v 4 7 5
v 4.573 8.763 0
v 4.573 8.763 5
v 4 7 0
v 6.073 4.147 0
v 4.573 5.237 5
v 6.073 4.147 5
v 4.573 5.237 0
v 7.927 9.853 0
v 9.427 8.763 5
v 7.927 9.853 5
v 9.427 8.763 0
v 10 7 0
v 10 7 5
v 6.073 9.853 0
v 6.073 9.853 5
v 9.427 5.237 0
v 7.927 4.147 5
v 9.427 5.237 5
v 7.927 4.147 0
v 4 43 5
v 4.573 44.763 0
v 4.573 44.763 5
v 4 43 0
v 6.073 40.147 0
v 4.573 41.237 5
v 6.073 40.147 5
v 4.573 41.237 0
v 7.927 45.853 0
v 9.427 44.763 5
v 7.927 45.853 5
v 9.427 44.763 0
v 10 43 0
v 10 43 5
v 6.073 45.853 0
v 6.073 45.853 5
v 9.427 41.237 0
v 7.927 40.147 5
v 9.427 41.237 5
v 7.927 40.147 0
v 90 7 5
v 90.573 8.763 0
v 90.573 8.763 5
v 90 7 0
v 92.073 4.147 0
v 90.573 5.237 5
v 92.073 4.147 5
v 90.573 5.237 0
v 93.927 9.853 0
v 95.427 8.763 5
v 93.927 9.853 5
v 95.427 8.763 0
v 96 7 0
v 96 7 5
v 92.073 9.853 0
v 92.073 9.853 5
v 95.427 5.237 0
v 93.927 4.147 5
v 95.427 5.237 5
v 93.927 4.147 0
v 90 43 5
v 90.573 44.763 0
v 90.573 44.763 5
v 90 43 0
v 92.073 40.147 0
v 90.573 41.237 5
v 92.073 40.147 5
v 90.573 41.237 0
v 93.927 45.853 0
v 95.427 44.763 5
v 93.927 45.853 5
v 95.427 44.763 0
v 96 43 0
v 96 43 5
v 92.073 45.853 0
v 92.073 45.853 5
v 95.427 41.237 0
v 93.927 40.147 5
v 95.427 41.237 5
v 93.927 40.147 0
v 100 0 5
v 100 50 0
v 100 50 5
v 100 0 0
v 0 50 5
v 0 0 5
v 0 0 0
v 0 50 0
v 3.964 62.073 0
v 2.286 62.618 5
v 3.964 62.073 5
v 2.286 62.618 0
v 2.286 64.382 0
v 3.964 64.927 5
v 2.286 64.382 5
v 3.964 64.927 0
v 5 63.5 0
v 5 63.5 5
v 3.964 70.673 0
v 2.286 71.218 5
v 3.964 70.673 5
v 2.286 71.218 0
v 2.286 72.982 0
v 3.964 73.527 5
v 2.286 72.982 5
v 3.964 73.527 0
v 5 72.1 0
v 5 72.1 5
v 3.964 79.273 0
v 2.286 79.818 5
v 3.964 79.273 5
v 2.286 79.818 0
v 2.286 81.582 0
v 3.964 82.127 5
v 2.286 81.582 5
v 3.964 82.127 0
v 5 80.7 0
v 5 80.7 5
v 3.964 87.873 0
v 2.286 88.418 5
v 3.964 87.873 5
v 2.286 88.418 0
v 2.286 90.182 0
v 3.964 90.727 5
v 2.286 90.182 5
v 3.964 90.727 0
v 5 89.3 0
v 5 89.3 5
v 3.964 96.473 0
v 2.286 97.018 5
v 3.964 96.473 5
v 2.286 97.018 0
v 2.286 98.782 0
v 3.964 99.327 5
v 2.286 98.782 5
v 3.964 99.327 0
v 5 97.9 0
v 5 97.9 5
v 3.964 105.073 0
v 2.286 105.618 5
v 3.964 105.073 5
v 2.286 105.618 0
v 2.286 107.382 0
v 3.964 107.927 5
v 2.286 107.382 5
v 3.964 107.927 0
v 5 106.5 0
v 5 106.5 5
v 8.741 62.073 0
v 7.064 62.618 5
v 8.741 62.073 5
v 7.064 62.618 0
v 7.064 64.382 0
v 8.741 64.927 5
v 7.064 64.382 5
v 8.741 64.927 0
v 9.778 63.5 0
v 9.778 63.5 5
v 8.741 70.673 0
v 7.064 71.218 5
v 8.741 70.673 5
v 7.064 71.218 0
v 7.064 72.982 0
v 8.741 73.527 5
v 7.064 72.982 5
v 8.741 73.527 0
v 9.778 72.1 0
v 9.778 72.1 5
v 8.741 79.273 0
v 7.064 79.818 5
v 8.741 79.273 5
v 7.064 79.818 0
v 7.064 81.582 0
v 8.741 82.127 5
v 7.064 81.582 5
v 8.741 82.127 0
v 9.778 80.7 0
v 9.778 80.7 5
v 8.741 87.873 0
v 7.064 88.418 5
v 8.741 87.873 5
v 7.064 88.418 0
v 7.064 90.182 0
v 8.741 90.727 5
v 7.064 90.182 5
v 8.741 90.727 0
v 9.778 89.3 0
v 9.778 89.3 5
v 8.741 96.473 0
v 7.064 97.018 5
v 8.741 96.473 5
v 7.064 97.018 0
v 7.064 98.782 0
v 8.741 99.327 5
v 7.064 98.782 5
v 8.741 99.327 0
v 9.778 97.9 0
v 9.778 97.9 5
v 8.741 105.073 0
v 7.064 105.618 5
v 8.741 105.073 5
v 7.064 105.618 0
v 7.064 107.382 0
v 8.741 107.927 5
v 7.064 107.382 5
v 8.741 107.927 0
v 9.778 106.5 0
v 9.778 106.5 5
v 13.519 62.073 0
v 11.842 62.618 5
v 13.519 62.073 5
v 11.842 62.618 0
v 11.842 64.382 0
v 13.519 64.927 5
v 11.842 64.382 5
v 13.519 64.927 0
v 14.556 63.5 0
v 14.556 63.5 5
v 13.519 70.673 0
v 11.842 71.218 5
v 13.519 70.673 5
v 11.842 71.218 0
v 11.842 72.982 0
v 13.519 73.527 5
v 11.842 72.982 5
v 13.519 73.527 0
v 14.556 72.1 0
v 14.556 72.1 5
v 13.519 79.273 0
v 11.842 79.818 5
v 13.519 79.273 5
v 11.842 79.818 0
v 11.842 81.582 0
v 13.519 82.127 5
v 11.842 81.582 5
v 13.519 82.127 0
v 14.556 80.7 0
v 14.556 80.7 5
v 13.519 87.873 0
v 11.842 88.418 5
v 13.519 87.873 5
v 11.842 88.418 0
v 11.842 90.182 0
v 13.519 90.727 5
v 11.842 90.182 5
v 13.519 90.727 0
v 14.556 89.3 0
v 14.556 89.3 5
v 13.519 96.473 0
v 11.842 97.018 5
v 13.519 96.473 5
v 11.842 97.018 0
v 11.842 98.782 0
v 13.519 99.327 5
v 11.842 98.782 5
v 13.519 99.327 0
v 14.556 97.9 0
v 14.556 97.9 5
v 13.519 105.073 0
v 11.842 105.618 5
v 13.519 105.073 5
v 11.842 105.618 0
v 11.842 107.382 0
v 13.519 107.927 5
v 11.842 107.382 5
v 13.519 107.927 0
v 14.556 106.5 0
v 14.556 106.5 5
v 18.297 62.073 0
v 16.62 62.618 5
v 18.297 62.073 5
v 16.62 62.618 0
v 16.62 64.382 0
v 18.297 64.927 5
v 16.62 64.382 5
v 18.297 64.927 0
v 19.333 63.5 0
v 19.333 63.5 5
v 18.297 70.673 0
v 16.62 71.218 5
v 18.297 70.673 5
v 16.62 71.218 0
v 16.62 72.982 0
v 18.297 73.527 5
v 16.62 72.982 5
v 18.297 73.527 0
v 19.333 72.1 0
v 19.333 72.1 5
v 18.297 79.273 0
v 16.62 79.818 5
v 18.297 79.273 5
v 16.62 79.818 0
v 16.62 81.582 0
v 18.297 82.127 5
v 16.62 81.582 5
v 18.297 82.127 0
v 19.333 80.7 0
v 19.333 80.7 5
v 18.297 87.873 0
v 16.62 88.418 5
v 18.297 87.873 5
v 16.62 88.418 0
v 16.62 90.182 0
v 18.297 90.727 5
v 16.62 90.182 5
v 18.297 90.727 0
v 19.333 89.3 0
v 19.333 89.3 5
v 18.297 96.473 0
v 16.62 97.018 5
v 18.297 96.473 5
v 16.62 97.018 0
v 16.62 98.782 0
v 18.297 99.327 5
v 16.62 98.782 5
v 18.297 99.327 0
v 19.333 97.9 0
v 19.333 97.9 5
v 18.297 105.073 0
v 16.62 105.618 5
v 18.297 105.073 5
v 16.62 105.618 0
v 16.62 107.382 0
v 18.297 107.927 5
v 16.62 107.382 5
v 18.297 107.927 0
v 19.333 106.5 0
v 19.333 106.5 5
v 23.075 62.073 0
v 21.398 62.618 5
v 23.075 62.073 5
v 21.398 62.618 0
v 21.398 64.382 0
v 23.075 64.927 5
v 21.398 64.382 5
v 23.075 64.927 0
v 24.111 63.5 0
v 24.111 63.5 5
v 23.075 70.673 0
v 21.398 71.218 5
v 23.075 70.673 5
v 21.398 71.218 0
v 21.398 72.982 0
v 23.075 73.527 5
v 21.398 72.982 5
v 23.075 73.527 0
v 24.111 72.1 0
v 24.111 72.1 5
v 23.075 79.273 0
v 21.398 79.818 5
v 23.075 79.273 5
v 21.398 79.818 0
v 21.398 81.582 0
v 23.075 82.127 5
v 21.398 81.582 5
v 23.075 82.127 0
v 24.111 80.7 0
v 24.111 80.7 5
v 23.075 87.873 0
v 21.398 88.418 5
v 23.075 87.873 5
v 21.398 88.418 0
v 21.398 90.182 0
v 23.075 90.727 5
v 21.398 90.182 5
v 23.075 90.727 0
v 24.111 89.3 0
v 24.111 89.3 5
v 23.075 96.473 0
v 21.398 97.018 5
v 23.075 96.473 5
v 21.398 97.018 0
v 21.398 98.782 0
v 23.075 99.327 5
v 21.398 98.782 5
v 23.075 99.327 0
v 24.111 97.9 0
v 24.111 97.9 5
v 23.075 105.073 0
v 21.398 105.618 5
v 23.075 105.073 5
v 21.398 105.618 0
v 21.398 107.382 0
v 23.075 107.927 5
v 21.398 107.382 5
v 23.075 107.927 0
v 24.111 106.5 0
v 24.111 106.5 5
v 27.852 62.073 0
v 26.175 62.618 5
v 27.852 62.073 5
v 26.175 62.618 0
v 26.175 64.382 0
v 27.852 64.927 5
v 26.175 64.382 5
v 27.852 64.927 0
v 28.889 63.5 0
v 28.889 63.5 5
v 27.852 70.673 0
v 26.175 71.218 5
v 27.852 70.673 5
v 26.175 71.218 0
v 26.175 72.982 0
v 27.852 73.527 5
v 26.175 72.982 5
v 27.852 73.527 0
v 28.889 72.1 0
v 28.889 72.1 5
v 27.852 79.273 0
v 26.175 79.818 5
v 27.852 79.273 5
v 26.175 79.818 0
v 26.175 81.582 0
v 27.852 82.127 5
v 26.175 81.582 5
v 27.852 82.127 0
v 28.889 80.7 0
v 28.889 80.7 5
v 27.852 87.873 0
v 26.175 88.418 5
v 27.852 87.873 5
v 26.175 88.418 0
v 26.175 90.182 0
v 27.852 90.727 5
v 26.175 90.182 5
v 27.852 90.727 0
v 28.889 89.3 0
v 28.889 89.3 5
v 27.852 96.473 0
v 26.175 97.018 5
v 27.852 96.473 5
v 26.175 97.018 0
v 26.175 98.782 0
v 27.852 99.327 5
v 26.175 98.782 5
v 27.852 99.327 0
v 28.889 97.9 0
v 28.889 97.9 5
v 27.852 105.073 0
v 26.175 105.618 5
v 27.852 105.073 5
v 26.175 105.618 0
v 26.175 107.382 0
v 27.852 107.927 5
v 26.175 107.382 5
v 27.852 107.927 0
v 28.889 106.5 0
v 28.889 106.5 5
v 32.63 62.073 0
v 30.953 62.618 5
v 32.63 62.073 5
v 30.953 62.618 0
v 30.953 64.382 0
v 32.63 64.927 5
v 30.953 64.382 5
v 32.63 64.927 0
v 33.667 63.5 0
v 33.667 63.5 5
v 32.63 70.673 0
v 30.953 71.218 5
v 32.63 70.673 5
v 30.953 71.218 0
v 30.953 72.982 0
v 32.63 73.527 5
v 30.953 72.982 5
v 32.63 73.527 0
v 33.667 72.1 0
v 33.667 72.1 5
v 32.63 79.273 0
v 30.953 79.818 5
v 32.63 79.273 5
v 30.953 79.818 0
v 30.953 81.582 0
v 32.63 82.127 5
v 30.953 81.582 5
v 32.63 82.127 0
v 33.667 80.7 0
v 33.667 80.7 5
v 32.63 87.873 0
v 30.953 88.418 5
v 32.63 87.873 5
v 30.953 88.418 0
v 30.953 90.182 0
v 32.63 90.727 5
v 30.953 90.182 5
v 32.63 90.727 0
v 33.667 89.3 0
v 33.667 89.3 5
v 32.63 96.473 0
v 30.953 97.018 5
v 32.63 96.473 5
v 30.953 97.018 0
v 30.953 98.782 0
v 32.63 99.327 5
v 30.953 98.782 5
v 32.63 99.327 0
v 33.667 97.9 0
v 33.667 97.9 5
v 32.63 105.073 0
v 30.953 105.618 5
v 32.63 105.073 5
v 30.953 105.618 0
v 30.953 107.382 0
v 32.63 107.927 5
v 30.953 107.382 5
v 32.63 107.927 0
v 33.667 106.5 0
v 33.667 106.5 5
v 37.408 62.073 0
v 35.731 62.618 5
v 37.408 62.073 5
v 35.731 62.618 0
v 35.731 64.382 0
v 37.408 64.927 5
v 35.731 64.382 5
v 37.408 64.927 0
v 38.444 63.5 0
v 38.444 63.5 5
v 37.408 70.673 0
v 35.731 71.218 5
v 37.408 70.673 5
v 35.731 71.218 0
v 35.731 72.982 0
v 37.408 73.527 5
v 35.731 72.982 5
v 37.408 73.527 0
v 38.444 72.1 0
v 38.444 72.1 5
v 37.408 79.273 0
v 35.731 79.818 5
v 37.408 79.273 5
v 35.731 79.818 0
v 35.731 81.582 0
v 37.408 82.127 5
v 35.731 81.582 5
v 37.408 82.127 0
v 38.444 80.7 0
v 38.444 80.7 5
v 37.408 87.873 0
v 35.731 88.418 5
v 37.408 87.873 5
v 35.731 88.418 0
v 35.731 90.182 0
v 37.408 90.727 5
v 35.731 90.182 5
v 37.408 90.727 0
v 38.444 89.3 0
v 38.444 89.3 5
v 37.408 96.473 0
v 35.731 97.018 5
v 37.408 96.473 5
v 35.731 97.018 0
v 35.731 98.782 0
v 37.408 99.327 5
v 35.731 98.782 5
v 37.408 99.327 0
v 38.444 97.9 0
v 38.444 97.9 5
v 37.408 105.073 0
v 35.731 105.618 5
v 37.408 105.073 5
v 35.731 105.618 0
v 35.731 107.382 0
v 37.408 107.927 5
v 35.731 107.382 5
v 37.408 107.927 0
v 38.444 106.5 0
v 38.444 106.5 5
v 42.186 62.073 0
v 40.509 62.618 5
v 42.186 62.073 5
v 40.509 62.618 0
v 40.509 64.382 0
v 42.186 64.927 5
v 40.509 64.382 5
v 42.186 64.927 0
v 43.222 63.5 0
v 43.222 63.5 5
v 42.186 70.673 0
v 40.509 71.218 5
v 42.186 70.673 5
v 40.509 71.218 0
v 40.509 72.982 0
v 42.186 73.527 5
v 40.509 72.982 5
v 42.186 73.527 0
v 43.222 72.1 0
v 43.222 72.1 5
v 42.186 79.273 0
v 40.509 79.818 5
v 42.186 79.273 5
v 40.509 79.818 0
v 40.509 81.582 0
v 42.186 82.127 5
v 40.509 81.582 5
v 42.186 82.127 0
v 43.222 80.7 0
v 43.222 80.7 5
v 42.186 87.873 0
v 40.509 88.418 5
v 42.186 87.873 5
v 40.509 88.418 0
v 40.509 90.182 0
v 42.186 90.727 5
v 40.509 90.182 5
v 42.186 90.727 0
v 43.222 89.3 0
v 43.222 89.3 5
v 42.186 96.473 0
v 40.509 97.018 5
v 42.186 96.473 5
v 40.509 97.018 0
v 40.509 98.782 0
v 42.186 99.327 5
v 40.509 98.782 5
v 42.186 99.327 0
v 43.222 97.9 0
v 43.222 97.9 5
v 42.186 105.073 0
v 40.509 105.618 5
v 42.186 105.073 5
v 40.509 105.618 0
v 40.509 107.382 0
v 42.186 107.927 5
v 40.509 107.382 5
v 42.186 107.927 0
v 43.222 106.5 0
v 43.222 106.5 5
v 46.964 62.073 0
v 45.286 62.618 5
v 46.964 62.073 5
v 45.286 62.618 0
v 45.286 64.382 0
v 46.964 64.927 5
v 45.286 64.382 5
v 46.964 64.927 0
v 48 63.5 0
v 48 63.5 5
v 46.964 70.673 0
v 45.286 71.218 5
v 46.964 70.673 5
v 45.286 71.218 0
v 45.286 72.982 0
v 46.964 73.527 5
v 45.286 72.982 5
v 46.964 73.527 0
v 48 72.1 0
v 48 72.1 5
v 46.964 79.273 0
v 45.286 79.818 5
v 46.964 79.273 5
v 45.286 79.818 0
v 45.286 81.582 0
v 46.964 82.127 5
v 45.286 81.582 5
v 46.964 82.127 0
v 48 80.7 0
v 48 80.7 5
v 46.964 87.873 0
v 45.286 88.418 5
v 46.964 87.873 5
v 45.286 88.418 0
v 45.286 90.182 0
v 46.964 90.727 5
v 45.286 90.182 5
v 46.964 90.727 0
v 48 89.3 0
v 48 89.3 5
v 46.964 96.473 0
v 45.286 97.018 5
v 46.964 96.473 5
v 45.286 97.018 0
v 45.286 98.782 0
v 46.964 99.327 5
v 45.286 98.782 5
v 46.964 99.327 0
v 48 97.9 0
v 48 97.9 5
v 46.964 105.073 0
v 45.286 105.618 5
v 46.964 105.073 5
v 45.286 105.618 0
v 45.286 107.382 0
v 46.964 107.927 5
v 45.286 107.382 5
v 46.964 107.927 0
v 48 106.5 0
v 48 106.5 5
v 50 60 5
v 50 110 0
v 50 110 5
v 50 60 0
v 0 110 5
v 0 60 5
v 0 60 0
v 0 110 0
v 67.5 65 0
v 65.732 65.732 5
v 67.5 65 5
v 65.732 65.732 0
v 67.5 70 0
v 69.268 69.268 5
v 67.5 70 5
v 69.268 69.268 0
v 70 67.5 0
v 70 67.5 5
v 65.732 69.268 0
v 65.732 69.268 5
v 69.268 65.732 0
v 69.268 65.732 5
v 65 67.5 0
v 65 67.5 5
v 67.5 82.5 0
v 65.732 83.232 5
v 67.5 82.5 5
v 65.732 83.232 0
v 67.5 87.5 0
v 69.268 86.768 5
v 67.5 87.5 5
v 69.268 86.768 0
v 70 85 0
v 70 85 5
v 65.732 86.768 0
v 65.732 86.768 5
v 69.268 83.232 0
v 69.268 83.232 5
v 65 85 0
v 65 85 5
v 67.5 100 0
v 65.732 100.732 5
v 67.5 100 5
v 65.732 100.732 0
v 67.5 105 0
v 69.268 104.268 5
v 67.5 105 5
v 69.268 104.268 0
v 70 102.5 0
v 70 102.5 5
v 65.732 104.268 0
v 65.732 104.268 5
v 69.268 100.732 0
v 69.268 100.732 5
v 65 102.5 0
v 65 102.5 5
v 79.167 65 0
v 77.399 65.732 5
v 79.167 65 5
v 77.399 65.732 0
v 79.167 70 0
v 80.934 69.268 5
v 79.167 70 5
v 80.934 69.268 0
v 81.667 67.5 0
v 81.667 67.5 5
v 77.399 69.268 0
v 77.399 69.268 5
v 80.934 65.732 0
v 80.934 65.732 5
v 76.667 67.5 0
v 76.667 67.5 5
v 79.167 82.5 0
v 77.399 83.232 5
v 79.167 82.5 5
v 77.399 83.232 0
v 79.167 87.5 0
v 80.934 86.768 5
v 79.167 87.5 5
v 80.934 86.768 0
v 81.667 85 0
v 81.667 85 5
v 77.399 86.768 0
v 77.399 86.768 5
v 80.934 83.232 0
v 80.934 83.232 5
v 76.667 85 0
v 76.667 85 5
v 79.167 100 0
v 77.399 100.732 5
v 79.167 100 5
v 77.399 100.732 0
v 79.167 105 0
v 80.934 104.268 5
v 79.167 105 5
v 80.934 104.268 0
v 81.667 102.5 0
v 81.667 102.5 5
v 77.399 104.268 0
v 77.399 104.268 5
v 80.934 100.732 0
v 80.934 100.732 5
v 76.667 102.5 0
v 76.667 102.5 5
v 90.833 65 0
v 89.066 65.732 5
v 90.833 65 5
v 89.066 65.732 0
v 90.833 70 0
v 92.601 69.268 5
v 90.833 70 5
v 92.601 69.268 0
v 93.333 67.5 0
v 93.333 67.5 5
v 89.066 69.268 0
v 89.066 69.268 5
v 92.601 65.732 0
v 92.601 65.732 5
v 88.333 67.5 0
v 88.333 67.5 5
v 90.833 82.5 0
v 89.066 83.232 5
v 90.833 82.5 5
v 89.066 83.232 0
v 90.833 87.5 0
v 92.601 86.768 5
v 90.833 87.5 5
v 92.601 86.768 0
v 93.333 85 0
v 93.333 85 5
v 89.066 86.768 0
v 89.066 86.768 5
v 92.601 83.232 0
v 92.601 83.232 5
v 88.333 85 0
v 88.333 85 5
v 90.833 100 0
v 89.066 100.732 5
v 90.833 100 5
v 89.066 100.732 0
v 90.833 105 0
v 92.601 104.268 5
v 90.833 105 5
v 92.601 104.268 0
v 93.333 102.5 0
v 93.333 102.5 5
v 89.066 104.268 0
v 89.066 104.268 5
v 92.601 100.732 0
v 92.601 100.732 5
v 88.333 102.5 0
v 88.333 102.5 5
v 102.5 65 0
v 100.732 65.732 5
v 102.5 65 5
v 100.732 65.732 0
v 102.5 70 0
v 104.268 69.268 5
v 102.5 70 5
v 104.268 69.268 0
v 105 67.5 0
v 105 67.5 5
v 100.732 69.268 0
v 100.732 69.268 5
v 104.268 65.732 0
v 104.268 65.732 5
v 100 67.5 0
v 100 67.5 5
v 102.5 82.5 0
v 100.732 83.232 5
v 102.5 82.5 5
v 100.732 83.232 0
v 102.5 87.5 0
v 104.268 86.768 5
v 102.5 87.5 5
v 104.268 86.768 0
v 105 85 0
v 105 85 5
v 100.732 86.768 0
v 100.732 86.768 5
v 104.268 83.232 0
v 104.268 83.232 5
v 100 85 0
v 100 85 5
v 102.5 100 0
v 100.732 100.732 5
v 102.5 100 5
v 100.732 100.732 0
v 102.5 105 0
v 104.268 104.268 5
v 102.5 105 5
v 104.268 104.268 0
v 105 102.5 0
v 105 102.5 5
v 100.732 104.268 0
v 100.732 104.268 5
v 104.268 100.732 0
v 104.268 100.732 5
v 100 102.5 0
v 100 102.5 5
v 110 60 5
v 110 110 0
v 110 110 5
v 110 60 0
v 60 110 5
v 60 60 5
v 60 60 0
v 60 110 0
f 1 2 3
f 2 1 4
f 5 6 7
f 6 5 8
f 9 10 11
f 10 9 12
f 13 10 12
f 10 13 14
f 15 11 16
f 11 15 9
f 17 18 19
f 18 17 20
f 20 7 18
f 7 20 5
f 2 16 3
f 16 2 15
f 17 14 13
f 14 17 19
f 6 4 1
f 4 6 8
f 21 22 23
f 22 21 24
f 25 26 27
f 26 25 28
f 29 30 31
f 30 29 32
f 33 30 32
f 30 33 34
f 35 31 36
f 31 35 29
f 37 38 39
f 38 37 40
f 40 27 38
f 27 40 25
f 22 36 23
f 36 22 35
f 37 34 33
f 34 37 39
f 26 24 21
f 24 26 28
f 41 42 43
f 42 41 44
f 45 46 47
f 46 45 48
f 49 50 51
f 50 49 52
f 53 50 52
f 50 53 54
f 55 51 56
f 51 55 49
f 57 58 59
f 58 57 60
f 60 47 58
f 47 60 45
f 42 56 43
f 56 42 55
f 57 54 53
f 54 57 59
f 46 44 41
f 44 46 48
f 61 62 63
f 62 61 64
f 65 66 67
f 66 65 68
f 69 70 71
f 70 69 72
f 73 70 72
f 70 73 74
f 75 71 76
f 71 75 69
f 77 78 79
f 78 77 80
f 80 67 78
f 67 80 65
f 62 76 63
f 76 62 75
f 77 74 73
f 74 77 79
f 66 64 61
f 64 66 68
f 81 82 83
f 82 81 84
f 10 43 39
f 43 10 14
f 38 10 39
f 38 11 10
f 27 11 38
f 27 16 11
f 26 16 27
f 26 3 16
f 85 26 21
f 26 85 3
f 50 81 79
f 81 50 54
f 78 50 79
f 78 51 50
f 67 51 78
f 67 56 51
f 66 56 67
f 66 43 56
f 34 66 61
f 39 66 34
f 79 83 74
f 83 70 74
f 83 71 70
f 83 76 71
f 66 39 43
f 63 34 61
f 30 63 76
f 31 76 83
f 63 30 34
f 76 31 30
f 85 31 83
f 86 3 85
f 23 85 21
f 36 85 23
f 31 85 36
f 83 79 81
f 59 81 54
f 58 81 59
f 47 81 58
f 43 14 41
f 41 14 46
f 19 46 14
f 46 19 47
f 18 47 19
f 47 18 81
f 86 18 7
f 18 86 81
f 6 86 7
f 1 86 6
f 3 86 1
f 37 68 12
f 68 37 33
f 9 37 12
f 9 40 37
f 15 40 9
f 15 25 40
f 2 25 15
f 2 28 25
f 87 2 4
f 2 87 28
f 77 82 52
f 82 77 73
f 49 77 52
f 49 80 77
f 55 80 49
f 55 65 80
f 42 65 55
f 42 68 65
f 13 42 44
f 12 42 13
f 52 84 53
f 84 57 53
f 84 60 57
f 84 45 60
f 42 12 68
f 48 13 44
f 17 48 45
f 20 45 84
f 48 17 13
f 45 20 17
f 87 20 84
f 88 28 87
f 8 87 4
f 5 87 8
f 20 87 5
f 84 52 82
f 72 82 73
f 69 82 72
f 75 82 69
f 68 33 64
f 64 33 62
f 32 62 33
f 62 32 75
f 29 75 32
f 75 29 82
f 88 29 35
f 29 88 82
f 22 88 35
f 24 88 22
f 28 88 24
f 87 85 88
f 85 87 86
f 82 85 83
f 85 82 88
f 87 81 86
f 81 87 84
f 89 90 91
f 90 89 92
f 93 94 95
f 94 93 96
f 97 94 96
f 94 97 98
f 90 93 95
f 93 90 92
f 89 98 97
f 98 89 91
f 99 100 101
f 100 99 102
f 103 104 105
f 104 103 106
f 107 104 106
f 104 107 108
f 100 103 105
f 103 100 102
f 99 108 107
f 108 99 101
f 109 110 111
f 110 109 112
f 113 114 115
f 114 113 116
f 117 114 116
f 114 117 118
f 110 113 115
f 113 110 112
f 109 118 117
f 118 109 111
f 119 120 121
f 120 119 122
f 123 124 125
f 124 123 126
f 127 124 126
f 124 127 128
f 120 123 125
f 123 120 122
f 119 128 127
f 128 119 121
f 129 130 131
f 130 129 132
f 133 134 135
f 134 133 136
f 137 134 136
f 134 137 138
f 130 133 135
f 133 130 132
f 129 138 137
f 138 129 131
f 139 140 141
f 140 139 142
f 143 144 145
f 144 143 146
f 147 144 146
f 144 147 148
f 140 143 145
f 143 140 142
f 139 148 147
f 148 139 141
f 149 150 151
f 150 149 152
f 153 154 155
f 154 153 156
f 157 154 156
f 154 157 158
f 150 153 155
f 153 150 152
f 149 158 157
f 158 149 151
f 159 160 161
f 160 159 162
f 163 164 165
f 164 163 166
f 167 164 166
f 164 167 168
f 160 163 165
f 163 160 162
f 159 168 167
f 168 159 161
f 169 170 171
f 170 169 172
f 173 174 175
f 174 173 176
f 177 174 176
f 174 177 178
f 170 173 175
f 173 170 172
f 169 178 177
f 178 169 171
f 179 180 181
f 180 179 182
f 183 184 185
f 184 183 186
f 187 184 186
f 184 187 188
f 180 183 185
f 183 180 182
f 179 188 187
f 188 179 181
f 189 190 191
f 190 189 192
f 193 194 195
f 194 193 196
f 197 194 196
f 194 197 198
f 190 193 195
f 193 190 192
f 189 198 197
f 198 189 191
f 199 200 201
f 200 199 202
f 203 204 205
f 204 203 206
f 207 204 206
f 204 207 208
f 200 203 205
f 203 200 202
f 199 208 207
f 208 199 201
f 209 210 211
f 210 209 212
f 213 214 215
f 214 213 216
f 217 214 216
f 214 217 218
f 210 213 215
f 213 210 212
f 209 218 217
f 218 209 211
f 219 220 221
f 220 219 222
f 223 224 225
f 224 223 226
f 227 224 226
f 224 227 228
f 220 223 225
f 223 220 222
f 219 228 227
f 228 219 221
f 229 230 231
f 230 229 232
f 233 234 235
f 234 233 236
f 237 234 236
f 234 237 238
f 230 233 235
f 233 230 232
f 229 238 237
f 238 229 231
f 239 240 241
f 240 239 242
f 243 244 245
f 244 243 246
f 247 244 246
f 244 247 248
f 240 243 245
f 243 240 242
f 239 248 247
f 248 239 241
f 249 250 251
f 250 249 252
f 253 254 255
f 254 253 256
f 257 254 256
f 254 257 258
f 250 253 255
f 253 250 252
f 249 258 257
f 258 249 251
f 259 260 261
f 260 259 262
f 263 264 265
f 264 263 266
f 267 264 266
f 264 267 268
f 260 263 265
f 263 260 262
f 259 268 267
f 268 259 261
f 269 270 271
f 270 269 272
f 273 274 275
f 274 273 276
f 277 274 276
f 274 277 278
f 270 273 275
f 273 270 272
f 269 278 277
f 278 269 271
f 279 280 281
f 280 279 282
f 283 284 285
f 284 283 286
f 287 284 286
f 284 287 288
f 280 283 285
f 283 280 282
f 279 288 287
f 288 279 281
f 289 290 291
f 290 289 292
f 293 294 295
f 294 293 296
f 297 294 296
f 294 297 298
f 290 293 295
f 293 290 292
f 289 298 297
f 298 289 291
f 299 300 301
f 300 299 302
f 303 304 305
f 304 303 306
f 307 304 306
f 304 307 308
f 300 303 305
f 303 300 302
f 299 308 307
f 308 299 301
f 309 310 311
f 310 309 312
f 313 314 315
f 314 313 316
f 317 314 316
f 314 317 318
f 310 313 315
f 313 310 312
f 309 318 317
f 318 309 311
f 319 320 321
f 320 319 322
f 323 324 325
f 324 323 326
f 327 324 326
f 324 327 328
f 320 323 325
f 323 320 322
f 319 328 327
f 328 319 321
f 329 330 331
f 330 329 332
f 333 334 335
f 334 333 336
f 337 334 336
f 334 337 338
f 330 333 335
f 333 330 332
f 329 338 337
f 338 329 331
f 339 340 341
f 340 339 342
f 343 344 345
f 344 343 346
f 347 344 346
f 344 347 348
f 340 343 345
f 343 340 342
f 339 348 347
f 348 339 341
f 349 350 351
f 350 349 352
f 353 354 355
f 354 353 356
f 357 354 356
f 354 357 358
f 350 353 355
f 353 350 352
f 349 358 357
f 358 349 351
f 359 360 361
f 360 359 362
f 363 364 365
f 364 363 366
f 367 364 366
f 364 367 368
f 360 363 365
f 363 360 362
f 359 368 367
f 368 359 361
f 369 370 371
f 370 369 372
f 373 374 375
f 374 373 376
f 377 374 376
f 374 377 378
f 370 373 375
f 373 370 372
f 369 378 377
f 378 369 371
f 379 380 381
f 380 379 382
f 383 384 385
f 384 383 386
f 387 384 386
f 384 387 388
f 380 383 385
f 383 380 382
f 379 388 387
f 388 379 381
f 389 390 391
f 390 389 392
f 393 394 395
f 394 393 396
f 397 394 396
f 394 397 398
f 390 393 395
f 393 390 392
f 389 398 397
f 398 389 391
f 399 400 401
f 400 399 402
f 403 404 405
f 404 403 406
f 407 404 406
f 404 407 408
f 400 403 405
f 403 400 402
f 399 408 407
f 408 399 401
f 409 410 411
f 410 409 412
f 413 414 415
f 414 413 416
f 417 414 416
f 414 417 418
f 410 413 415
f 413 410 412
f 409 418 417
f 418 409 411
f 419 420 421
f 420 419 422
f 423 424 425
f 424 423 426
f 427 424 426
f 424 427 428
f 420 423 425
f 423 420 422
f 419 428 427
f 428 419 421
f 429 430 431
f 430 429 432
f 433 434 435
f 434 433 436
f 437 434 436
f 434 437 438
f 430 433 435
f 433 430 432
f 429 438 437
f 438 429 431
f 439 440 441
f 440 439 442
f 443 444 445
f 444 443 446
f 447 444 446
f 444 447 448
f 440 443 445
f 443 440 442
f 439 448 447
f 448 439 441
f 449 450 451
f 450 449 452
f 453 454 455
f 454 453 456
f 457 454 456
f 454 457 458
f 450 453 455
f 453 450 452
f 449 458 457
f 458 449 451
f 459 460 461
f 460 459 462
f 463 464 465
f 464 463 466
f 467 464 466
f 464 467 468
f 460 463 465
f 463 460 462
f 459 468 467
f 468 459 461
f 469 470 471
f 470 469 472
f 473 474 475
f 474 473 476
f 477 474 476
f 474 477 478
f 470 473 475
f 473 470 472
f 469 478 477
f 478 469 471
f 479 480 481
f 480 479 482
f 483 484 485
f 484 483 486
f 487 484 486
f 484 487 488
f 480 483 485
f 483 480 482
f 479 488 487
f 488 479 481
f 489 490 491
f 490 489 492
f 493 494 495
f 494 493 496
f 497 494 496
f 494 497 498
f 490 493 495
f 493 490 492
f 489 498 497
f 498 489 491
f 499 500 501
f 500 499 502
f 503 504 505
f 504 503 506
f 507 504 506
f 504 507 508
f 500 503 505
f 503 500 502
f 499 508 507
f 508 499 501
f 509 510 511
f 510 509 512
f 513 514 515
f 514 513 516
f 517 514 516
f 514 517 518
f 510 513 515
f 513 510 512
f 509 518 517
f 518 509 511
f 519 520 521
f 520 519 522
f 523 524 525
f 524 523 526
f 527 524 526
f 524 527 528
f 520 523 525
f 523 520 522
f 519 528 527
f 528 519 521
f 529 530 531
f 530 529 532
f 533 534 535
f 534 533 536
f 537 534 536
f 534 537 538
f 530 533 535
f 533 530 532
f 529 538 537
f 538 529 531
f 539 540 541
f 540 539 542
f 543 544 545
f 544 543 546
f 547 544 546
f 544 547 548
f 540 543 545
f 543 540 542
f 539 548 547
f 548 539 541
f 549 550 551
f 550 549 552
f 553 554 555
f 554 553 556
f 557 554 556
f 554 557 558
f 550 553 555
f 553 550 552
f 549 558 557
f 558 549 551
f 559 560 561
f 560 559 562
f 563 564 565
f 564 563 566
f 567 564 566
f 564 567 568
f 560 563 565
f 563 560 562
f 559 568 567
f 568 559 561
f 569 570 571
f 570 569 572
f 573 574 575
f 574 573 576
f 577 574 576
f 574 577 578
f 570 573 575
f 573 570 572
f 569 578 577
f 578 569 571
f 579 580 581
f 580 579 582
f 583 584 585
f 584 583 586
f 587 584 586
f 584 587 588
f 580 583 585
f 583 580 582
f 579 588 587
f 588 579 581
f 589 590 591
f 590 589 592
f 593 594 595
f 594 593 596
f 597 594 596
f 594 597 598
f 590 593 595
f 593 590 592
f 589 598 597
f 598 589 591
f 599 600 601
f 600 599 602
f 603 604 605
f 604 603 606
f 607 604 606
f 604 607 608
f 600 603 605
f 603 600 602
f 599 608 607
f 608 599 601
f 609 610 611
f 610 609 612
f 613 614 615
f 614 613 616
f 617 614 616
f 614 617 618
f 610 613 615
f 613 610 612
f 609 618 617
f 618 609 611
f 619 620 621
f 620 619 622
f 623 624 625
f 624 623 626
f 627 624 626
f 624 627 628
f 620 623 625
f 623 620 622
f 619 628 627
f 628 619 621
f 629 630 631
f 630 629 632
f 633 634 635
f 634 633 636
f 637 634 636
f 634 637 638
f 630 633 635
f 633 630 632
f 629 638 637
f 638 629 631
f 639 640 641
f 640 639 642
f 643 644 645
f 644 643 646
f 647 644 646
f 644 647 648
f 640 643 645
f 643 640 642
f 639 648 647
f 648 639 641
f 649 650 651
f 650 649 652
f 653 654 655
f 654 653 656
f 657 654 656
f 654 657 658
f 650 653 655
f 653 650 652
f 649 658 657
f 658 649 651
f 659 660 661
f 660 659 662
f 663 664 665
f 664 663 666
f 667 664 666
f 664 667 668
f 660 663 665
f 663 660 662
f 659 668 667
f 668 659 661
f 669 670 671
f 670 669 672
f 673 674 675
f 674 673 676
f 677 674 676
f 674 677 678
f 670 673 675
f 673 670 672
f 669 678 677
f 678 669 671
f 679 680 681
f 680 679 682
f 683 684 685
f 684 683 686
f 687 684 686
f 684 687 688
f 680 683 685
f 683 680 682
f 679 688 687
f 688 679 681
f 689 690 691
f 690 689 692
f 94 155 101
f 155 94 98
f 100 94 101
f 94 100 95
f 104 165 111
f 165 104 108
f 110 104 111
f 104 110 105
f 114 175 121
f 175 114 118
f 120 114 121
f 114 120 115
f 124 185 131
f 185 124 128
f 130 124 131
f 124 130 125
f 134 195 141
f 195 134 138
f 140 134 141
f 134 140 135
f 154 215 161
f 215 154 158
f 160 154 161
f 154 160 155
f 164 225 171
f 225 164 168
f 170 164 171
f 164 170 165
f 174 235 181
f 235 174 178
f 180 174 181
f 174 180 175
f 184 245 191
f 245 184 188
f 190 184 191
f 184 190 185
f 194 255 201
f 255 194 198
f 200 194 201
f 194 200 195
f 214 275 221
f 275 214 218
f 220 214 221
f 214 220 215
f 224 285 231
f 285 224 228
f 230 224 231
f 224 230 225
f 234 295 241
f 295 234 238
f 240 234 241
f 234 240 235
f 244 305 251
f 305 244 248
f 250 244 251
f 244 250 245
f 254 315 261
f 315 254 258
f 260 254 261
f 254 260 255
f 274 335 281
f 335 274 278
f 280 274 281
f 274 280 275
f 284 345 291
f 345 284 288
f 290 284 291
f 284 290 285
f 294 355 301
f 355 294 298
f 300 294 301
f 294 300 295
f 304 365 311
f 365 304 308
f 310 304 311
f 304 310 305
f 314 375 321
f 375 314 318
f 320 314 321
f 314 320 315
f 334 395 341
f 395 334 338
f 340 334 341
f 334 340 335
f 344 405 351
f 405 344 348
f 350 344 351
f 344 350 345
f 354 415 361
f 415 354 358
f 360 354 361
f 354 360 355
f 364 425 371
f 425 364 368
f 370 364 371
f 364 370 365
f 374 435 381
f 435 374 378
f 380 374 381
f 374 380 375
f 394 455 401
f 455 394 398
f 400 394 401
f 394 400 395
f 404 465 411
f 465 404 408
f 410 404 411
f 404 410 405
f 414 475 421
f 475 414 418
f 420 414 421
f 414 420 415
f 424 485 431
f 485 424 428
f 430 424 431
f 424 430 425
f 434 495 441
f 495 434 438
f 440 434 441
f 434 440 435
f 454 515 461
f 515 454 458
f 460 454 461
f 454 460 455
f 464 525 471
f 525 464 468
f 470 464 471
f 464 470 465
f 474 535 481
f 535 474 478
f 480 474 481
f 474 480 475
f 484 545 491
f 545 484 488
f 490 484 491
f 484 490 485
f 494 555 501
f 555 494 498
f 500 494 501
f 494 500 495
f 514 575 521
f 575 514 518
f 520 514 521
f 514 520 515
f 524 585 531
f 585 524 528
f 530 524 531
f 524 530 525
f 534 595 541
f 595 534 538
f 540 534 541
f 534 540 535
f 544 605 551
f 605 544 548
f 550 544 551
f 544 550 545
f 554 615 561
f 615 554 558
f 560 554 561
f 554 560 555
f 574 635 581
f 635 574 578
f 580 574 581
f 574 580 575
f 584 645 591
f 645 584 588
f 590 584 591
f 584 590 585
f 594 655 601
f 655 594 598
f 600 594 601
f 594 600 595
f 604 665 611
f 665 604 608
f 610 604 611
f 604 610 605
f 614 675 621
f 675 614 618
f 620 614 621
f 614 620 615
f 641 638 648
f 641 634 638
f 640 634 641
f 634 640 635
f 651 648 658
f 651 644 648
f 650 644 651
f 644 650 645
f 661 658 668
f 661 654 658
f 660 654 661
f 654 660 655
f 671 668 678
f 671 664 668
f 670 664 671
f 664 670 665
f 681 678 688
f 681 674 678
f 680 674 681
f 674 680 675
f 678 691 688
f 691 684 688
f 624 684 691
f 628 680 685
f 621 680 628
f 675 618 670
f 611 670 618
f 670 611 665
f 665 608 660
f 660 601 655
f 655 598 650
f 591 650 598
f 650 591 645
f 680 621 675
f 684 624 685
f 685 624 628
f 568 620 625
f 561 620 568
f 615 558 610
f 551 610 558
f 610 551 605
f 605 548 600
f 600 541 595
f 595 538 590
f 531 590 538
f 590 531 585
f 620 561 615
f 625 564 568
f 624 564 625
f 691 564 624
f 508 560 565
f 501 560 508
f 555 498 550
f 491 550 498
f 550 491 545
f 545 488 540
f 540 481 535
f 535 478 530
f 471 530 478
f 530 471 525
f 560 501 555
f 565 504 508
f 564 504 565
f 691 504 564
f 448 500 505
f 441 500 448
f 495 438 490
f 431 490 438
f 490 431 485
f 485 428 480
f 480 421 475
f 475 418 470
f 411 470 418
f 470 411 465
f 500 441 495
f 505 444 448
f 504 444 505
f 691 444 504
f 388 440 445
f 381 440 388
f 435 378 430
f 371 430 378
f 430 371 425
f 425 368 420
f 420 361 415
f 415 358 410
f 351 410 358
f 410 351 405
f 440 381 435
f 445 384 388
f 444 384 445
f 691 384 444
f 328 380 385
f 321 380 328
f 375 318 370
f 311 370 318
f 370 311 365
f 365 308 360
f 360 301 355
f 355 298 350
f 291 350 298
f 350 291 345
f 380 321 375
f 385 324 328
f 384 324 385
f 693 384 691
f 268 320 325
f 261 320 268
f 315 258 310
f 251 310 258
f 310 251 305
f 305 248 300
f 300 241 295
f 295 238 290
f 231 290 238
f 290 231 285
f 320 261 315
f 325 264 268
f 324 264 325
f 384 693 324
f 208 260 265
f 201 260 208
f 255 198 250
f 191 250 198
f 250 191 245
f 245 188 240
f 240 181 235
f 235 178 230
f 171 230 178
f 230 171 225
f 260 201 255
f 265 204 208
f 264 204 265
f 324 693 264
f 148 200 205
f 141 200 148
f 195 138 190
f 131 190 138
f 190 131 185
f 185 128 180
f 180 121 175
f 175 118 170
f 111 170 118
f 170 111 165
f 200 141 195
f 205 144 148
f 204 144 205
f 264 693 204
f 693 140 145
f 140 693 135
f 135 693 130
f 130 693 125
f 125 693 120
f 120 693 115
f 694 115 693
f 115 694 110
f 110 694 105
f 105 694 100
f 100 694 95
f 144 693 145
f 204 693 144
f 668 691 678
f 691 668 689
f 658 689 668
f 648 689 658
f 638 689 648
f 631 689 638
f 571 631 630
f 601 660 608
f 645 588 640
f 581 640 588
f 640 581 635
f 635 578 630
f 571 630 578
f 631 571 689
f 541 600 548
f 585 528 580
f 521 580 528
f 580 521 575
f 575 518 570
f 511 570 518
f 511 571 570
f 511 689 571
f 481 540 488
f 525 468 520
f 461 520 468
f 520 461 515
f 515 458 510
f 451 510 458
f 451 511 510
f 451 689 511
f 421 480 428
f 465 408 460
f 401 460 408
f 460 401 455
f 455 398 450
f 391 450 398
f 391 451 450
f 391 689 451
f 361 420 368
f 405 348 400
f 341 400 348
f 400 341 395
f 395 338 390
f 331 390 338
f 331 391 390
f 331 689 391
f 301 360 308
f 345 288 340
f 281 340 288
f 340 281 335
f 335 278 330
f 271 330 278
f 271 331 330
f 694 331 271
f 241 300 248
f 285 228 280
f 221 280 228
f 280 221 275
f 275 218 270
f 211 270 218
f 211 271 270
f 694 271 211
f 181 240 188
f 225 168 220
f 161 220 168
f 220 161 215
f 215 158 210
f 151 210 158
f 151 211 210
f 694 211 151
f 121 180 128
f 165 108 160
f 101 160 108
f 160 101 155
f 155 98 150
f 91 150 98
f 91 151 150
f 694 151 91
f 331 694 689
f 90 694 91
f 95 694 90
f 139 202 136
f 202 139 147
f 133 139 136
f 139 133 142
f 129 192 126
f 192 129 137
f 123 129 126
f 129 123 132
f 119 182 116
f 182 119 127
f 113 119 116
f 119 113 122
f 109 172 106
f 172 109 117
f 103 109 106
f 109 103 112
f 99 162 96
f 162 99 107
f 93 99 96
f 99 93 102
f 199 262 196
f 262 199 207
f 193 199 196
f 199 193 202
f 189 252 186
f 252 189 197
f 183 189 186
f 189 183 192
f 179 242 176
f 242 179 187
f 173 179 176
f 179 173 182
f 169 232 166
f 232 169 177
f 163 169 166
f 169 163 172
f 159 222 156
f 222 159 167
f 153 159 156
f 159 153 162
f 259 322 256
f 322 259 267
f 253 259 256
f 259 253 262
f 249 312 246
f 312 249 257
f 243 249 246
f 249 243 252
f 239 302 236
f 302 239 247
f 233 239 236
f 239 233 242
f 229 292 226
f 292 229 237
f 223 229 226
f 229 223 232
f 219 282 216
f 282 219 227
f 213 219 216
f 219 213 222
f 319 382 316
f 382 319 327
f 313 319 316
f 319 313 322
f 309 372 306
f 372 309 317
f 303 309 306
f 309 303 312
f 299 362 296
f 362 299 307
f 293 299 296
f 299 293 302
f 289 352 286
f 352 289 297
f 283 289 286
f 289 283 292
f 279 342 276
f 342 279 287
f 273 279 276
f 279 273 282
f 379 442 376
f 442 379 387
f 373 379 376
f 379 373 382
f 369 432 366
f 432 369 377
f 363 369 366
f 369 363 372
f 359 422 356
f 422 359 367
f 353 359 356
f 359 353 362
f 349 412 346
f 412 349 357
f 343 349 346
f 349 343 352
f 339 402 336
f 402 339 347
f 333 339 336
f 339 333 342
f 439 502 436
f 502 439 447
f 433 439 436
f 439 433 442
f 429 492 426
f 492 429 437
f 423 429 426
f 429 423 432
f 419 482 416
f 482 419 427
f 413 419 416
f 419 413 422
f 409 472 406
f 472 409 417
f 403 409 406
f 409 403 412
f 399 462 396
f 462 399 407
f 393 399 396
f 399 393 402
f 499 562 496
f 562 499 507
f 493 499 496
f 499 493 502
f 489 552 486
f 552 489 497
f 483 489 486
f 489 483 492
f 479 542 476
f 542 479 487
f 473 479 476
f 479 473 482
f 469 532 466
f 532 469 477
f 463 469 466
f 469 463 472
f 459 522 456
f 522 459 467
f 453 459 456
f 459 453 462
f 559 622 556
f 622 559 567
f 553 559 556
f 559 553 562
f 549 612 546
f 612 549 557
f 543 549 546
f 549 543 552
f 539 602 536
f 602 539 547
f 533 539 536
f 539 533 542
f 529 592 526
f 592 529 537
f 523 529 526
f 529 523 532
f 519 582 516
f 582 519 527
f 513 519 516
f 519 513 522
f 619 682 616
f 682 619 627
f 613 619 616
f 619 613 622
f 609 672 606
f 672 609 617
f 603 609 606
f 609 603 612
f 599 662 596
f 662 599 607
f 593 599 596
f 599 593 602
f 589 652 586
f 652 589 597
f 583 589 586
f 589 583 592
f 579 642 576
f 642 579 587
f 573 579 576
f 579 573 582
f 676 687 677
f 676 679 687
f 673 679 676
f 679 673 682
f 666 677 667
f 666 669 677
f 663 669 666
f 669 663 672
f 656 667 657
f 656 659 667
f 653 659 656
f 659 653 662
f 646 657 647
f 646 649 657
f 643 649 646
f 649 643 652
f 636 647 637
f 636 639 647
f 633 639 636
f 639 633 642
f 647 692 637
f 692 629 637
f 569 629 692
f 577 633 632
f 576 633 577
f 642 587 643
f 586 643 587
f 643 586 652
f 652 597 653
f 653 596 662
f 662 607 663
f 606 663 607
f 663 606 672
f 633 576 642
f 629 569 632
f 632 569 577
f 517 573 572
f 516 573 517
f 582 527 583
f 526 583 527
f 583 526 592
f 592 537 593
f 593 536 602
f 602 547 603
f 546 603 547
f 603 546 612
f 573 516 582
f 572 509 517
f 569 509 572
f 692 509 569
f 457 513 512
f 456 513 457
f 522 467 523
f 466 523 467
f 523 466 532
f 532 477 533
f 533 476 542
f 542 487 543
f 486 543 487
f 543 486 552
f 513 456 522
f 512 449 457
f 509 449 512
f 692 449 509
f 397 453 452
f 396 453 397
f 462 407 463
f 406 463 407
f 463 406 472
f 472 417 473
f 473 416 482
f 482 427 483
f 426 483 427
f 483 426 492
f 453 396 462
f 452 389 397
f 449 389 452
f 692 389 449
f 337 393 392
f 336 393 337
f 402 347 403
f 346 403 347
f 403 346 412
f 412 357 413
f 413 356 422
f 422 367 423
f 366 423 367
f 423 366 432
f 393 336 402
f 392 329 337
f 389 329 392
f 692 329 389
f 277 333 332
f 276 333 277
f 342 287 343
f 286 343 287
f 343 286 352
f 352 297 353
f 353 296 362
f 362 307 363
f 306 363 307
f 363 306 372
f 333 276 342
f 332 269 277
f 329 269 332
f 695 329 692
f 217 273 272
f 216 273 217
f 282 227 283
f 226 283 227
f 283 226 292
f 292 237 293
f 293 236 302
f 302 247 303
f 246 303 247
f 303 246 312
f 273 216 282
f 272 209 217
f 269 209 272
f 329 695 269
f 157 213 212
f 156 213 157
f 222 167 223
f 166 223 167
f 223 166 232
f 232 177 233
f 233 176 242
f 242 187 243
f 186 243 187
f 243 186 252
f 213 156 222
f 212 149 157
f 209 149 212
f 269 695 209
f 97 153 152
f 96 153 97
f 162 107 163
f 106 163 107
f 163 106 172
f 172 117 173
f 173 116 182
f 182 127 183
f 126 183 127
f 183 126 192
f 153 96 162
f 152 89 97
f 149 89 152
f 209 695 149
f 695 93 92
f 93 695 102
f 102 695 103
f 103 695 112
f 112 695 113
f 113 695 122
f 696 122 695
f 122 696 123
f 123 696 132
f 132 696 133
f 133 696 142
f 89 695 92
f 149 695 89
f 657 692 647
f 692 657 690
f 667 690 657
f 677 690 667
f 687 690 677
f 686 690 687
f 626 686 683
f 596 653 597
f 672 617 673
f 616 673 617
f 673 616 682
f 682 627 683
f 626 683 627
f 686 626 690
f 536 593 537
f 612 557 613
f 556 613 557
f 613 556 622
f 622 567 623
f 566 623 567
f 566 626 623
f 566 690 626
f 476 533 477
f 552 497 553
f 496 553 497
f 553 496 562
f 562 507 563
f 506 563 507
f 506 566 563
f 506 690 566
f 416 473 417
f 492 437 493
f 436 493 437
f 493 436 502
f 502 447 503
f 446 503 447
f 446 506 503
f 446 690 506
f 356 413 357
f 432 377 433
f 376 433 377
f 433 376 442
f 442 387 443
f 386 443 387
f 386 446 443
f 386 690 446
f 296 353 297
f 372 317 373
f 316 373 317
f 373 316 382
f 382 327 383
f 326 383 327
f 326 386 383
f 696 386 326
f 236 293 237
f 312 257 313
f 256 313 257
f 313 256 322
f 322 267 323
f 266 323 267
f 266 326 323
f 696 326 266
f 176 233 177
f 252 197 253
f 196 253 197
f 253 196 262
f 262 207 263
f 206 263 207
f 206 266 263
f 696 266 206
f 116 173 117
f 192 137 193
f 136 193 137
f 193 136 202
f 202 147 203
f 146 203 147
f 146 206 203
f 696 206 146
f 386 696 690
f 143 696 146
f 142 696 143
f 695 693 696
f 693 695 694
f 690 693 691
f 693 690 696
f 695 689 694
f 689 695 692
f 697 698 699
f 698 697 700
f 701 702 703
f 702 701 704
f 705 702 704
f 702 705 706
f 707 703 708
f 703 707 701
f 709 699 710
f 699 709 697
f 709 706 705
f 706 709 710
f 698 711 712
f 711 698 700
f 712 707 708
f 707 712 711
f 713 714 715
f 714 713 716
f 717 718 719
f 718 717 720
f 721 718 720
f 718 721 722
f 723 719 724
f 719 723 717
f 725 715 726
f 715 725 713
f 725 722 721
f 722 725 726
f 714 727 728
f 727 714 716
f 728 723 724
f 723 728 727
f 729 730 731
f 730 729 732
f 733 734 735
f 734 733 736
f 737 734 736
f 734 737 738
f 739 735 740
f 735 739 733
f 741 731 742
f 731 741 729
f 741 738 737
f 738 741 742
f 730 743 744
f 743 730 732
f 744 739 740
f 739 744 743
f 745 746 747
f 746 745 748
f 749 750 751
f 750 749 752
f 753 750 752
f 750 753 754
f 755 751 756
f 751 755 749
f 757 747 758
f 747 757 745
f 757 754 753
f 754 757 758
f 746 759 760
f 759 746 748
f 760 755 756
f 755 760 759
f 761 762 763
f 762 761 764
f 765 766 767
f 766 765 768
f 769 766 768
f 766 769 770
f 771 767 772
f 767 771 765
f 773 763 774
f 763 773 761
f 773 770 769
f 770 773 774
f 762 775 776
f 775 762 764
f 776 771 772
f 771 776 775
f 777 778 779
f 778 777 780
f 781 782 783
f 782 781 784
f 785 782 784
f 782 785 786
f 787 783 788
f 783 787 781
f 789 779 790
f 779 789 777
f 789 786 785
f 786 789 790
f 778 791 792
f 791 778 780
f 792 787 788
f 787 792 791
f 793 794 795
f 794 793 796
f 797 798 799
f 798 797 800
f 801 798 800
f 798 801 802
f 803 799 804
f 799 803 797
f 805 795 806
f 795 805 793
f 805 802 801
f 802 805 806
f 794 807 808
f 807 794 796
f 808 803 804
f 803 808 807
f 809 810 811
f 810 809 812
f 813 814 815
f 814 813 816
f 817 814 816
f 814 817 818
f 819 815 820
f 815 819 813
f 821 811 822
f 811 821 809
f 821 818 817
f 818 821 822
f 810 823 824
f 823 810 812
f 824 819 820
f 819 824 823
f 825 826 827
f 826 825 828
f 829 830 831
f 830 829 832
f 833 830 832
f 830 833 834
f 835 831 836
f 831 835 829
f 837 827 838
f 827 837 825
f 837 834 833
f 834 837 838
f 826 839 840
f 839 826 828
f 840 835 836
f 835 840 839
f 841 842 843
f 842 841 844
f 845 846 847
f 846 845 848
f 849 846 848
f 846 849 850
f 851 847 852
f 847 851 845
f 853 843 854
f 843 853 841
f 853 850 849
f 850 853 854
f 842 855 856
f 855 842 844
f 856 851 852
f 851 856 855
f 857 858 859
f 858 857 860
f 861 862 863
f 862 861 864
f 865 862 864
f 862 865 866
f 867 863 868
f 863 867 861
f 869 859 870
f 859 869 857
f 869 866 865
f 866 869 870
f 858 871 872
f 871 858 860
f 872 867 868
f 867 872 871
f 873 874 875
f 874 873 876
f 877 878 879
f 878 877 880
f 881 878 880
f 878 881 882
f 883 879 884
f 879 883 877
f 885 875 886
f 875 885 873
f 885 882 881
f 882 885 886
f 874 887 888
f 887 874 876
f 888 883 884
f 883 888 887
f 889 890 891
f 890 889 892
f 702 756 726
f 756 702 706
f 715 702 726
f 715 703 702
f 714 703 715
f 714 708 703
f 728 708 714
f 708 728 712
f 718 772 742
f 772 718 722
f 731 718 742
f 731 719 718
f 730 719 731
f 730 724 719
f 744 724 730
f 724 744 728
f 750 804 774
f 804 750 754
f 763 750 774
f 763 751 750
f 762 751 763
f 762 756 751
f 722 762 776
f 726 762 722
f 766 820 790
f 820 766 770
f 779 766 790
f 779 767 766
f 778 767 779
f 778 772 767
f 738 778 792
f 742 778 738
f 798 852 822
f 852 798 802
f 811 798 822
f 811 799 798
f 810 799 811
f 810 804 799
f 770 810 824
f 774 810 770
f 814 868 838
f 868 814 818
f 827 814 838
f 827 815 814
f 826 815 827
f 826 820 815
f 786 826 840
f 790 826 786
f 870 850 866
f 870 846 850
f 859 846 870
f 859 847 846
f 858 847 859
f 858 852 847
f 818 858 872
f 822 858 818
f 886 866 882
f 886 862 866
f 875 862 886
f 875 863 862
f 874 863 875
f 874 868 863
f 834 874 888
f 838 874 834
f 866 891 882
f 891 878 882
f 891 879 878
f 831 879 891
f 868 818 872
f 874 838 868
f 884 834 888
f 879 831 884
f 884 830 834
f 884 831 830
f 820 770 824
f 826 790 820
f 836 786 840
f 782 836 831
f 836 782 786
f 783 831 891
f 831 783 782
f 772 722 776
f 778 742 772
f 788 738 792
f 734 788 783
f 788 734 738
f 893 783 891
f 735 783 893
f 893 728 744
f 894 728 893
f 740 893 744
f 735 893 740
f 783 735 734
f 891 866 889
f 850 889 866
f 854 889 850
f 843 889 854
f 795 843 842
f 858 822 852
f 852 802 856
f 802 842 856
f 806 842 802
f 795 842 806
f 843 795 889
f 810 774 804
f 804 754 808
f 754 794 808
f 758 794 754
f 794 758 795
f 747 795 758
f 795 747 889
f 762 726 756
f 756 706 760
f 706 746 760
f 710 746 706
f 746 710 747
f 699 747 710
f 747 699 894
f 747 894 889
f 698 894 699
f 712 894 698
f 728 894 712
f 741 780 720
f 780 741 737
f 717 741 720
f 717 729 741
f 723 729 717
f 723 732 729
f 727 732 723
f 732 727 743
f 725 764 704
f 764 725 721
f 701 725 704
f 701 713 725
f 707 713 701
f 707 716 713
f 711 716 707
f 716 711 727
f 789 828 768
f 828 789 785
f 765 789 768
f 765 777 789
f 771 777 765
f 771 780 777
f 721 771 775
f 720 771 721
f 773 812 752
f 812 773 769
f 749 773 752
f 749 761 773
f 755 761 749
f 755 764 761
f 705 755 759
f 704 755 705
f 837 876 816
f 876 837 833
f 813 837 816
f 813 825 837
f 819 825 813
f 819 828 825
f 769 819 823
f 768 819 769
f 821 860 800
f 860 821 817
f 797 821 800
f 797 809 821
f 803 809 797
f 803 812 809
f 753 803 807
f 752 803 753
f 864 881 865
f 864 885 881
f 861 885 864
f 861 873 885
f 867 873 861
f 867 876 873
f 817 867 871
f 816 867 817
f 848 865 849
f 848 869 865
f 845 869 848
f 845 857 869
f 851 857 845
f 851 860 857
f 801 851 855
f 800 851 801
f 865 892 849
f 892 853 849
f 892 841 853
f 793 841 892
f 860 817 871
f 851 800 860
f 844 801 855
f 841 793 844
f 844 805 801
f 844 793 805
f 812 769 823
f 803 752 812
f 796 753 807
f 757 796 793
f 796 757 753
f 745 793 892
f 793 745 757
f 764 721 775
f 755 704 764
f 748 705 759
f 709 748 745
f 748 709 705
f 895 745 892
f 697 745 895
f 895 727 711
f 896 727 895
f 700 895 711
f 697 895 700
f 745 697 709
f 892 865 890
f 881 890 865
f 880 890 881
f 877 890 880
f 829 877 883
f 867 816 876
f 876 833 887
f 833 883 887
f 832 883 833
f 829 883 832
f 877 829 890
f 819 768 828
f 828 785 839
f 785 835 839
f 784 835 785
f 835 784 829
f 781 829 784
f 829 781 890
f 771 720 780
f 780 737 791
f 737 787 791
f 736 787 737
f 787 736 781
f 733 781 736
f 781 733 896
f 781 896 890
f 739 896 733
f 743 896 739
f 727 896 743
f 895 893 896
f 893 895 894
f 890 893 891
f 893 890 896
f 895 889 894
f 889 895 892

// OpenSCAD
module hole_plate( size=[100,50,5], hole_dm=6, hole_margin=4, hole_count = [2,2]) {
    
    difference() {
        cube(size);
        
        abs_margin = hole_margin + hole_dm / 2;
        x_hole_dist = (size.x - 2 * abs_margin) / (hole_count.x -1);
        y_hole_dist = (size.y - 2 * abs_margin) / (hole_count.y -1);
        echo(x_hole_dist, y_hole_dist);
        x_values = [abs_margin : x_hole_dist : size.x - abs_margin + 0.1];
        y_values = [abs_margin : y_hole_dist : size.y - abs_margin + 0.1];
        
        // 4 holes with for loop
        for (x = x_values, y = y_values)
            translate([x, y, -1])
            color( "red" )
                cylinder( h = size.z + 2, d = hole_dm);
    }
}

hole_plate([100,50,5], 6, 4);


translate( [0, 60, 0])
hole_plate( 
    size = [50,50,5], 
    hole_margin = 2, 
    hole_dm = 3,
    hole_count = [10,6]
);

translate( [60, 60, 0])
hole_plate( 
    size = [50,50,5], 
    hole_margin = 5, 
    hole_dm = 5,
    hole_count = [4,3]
);
